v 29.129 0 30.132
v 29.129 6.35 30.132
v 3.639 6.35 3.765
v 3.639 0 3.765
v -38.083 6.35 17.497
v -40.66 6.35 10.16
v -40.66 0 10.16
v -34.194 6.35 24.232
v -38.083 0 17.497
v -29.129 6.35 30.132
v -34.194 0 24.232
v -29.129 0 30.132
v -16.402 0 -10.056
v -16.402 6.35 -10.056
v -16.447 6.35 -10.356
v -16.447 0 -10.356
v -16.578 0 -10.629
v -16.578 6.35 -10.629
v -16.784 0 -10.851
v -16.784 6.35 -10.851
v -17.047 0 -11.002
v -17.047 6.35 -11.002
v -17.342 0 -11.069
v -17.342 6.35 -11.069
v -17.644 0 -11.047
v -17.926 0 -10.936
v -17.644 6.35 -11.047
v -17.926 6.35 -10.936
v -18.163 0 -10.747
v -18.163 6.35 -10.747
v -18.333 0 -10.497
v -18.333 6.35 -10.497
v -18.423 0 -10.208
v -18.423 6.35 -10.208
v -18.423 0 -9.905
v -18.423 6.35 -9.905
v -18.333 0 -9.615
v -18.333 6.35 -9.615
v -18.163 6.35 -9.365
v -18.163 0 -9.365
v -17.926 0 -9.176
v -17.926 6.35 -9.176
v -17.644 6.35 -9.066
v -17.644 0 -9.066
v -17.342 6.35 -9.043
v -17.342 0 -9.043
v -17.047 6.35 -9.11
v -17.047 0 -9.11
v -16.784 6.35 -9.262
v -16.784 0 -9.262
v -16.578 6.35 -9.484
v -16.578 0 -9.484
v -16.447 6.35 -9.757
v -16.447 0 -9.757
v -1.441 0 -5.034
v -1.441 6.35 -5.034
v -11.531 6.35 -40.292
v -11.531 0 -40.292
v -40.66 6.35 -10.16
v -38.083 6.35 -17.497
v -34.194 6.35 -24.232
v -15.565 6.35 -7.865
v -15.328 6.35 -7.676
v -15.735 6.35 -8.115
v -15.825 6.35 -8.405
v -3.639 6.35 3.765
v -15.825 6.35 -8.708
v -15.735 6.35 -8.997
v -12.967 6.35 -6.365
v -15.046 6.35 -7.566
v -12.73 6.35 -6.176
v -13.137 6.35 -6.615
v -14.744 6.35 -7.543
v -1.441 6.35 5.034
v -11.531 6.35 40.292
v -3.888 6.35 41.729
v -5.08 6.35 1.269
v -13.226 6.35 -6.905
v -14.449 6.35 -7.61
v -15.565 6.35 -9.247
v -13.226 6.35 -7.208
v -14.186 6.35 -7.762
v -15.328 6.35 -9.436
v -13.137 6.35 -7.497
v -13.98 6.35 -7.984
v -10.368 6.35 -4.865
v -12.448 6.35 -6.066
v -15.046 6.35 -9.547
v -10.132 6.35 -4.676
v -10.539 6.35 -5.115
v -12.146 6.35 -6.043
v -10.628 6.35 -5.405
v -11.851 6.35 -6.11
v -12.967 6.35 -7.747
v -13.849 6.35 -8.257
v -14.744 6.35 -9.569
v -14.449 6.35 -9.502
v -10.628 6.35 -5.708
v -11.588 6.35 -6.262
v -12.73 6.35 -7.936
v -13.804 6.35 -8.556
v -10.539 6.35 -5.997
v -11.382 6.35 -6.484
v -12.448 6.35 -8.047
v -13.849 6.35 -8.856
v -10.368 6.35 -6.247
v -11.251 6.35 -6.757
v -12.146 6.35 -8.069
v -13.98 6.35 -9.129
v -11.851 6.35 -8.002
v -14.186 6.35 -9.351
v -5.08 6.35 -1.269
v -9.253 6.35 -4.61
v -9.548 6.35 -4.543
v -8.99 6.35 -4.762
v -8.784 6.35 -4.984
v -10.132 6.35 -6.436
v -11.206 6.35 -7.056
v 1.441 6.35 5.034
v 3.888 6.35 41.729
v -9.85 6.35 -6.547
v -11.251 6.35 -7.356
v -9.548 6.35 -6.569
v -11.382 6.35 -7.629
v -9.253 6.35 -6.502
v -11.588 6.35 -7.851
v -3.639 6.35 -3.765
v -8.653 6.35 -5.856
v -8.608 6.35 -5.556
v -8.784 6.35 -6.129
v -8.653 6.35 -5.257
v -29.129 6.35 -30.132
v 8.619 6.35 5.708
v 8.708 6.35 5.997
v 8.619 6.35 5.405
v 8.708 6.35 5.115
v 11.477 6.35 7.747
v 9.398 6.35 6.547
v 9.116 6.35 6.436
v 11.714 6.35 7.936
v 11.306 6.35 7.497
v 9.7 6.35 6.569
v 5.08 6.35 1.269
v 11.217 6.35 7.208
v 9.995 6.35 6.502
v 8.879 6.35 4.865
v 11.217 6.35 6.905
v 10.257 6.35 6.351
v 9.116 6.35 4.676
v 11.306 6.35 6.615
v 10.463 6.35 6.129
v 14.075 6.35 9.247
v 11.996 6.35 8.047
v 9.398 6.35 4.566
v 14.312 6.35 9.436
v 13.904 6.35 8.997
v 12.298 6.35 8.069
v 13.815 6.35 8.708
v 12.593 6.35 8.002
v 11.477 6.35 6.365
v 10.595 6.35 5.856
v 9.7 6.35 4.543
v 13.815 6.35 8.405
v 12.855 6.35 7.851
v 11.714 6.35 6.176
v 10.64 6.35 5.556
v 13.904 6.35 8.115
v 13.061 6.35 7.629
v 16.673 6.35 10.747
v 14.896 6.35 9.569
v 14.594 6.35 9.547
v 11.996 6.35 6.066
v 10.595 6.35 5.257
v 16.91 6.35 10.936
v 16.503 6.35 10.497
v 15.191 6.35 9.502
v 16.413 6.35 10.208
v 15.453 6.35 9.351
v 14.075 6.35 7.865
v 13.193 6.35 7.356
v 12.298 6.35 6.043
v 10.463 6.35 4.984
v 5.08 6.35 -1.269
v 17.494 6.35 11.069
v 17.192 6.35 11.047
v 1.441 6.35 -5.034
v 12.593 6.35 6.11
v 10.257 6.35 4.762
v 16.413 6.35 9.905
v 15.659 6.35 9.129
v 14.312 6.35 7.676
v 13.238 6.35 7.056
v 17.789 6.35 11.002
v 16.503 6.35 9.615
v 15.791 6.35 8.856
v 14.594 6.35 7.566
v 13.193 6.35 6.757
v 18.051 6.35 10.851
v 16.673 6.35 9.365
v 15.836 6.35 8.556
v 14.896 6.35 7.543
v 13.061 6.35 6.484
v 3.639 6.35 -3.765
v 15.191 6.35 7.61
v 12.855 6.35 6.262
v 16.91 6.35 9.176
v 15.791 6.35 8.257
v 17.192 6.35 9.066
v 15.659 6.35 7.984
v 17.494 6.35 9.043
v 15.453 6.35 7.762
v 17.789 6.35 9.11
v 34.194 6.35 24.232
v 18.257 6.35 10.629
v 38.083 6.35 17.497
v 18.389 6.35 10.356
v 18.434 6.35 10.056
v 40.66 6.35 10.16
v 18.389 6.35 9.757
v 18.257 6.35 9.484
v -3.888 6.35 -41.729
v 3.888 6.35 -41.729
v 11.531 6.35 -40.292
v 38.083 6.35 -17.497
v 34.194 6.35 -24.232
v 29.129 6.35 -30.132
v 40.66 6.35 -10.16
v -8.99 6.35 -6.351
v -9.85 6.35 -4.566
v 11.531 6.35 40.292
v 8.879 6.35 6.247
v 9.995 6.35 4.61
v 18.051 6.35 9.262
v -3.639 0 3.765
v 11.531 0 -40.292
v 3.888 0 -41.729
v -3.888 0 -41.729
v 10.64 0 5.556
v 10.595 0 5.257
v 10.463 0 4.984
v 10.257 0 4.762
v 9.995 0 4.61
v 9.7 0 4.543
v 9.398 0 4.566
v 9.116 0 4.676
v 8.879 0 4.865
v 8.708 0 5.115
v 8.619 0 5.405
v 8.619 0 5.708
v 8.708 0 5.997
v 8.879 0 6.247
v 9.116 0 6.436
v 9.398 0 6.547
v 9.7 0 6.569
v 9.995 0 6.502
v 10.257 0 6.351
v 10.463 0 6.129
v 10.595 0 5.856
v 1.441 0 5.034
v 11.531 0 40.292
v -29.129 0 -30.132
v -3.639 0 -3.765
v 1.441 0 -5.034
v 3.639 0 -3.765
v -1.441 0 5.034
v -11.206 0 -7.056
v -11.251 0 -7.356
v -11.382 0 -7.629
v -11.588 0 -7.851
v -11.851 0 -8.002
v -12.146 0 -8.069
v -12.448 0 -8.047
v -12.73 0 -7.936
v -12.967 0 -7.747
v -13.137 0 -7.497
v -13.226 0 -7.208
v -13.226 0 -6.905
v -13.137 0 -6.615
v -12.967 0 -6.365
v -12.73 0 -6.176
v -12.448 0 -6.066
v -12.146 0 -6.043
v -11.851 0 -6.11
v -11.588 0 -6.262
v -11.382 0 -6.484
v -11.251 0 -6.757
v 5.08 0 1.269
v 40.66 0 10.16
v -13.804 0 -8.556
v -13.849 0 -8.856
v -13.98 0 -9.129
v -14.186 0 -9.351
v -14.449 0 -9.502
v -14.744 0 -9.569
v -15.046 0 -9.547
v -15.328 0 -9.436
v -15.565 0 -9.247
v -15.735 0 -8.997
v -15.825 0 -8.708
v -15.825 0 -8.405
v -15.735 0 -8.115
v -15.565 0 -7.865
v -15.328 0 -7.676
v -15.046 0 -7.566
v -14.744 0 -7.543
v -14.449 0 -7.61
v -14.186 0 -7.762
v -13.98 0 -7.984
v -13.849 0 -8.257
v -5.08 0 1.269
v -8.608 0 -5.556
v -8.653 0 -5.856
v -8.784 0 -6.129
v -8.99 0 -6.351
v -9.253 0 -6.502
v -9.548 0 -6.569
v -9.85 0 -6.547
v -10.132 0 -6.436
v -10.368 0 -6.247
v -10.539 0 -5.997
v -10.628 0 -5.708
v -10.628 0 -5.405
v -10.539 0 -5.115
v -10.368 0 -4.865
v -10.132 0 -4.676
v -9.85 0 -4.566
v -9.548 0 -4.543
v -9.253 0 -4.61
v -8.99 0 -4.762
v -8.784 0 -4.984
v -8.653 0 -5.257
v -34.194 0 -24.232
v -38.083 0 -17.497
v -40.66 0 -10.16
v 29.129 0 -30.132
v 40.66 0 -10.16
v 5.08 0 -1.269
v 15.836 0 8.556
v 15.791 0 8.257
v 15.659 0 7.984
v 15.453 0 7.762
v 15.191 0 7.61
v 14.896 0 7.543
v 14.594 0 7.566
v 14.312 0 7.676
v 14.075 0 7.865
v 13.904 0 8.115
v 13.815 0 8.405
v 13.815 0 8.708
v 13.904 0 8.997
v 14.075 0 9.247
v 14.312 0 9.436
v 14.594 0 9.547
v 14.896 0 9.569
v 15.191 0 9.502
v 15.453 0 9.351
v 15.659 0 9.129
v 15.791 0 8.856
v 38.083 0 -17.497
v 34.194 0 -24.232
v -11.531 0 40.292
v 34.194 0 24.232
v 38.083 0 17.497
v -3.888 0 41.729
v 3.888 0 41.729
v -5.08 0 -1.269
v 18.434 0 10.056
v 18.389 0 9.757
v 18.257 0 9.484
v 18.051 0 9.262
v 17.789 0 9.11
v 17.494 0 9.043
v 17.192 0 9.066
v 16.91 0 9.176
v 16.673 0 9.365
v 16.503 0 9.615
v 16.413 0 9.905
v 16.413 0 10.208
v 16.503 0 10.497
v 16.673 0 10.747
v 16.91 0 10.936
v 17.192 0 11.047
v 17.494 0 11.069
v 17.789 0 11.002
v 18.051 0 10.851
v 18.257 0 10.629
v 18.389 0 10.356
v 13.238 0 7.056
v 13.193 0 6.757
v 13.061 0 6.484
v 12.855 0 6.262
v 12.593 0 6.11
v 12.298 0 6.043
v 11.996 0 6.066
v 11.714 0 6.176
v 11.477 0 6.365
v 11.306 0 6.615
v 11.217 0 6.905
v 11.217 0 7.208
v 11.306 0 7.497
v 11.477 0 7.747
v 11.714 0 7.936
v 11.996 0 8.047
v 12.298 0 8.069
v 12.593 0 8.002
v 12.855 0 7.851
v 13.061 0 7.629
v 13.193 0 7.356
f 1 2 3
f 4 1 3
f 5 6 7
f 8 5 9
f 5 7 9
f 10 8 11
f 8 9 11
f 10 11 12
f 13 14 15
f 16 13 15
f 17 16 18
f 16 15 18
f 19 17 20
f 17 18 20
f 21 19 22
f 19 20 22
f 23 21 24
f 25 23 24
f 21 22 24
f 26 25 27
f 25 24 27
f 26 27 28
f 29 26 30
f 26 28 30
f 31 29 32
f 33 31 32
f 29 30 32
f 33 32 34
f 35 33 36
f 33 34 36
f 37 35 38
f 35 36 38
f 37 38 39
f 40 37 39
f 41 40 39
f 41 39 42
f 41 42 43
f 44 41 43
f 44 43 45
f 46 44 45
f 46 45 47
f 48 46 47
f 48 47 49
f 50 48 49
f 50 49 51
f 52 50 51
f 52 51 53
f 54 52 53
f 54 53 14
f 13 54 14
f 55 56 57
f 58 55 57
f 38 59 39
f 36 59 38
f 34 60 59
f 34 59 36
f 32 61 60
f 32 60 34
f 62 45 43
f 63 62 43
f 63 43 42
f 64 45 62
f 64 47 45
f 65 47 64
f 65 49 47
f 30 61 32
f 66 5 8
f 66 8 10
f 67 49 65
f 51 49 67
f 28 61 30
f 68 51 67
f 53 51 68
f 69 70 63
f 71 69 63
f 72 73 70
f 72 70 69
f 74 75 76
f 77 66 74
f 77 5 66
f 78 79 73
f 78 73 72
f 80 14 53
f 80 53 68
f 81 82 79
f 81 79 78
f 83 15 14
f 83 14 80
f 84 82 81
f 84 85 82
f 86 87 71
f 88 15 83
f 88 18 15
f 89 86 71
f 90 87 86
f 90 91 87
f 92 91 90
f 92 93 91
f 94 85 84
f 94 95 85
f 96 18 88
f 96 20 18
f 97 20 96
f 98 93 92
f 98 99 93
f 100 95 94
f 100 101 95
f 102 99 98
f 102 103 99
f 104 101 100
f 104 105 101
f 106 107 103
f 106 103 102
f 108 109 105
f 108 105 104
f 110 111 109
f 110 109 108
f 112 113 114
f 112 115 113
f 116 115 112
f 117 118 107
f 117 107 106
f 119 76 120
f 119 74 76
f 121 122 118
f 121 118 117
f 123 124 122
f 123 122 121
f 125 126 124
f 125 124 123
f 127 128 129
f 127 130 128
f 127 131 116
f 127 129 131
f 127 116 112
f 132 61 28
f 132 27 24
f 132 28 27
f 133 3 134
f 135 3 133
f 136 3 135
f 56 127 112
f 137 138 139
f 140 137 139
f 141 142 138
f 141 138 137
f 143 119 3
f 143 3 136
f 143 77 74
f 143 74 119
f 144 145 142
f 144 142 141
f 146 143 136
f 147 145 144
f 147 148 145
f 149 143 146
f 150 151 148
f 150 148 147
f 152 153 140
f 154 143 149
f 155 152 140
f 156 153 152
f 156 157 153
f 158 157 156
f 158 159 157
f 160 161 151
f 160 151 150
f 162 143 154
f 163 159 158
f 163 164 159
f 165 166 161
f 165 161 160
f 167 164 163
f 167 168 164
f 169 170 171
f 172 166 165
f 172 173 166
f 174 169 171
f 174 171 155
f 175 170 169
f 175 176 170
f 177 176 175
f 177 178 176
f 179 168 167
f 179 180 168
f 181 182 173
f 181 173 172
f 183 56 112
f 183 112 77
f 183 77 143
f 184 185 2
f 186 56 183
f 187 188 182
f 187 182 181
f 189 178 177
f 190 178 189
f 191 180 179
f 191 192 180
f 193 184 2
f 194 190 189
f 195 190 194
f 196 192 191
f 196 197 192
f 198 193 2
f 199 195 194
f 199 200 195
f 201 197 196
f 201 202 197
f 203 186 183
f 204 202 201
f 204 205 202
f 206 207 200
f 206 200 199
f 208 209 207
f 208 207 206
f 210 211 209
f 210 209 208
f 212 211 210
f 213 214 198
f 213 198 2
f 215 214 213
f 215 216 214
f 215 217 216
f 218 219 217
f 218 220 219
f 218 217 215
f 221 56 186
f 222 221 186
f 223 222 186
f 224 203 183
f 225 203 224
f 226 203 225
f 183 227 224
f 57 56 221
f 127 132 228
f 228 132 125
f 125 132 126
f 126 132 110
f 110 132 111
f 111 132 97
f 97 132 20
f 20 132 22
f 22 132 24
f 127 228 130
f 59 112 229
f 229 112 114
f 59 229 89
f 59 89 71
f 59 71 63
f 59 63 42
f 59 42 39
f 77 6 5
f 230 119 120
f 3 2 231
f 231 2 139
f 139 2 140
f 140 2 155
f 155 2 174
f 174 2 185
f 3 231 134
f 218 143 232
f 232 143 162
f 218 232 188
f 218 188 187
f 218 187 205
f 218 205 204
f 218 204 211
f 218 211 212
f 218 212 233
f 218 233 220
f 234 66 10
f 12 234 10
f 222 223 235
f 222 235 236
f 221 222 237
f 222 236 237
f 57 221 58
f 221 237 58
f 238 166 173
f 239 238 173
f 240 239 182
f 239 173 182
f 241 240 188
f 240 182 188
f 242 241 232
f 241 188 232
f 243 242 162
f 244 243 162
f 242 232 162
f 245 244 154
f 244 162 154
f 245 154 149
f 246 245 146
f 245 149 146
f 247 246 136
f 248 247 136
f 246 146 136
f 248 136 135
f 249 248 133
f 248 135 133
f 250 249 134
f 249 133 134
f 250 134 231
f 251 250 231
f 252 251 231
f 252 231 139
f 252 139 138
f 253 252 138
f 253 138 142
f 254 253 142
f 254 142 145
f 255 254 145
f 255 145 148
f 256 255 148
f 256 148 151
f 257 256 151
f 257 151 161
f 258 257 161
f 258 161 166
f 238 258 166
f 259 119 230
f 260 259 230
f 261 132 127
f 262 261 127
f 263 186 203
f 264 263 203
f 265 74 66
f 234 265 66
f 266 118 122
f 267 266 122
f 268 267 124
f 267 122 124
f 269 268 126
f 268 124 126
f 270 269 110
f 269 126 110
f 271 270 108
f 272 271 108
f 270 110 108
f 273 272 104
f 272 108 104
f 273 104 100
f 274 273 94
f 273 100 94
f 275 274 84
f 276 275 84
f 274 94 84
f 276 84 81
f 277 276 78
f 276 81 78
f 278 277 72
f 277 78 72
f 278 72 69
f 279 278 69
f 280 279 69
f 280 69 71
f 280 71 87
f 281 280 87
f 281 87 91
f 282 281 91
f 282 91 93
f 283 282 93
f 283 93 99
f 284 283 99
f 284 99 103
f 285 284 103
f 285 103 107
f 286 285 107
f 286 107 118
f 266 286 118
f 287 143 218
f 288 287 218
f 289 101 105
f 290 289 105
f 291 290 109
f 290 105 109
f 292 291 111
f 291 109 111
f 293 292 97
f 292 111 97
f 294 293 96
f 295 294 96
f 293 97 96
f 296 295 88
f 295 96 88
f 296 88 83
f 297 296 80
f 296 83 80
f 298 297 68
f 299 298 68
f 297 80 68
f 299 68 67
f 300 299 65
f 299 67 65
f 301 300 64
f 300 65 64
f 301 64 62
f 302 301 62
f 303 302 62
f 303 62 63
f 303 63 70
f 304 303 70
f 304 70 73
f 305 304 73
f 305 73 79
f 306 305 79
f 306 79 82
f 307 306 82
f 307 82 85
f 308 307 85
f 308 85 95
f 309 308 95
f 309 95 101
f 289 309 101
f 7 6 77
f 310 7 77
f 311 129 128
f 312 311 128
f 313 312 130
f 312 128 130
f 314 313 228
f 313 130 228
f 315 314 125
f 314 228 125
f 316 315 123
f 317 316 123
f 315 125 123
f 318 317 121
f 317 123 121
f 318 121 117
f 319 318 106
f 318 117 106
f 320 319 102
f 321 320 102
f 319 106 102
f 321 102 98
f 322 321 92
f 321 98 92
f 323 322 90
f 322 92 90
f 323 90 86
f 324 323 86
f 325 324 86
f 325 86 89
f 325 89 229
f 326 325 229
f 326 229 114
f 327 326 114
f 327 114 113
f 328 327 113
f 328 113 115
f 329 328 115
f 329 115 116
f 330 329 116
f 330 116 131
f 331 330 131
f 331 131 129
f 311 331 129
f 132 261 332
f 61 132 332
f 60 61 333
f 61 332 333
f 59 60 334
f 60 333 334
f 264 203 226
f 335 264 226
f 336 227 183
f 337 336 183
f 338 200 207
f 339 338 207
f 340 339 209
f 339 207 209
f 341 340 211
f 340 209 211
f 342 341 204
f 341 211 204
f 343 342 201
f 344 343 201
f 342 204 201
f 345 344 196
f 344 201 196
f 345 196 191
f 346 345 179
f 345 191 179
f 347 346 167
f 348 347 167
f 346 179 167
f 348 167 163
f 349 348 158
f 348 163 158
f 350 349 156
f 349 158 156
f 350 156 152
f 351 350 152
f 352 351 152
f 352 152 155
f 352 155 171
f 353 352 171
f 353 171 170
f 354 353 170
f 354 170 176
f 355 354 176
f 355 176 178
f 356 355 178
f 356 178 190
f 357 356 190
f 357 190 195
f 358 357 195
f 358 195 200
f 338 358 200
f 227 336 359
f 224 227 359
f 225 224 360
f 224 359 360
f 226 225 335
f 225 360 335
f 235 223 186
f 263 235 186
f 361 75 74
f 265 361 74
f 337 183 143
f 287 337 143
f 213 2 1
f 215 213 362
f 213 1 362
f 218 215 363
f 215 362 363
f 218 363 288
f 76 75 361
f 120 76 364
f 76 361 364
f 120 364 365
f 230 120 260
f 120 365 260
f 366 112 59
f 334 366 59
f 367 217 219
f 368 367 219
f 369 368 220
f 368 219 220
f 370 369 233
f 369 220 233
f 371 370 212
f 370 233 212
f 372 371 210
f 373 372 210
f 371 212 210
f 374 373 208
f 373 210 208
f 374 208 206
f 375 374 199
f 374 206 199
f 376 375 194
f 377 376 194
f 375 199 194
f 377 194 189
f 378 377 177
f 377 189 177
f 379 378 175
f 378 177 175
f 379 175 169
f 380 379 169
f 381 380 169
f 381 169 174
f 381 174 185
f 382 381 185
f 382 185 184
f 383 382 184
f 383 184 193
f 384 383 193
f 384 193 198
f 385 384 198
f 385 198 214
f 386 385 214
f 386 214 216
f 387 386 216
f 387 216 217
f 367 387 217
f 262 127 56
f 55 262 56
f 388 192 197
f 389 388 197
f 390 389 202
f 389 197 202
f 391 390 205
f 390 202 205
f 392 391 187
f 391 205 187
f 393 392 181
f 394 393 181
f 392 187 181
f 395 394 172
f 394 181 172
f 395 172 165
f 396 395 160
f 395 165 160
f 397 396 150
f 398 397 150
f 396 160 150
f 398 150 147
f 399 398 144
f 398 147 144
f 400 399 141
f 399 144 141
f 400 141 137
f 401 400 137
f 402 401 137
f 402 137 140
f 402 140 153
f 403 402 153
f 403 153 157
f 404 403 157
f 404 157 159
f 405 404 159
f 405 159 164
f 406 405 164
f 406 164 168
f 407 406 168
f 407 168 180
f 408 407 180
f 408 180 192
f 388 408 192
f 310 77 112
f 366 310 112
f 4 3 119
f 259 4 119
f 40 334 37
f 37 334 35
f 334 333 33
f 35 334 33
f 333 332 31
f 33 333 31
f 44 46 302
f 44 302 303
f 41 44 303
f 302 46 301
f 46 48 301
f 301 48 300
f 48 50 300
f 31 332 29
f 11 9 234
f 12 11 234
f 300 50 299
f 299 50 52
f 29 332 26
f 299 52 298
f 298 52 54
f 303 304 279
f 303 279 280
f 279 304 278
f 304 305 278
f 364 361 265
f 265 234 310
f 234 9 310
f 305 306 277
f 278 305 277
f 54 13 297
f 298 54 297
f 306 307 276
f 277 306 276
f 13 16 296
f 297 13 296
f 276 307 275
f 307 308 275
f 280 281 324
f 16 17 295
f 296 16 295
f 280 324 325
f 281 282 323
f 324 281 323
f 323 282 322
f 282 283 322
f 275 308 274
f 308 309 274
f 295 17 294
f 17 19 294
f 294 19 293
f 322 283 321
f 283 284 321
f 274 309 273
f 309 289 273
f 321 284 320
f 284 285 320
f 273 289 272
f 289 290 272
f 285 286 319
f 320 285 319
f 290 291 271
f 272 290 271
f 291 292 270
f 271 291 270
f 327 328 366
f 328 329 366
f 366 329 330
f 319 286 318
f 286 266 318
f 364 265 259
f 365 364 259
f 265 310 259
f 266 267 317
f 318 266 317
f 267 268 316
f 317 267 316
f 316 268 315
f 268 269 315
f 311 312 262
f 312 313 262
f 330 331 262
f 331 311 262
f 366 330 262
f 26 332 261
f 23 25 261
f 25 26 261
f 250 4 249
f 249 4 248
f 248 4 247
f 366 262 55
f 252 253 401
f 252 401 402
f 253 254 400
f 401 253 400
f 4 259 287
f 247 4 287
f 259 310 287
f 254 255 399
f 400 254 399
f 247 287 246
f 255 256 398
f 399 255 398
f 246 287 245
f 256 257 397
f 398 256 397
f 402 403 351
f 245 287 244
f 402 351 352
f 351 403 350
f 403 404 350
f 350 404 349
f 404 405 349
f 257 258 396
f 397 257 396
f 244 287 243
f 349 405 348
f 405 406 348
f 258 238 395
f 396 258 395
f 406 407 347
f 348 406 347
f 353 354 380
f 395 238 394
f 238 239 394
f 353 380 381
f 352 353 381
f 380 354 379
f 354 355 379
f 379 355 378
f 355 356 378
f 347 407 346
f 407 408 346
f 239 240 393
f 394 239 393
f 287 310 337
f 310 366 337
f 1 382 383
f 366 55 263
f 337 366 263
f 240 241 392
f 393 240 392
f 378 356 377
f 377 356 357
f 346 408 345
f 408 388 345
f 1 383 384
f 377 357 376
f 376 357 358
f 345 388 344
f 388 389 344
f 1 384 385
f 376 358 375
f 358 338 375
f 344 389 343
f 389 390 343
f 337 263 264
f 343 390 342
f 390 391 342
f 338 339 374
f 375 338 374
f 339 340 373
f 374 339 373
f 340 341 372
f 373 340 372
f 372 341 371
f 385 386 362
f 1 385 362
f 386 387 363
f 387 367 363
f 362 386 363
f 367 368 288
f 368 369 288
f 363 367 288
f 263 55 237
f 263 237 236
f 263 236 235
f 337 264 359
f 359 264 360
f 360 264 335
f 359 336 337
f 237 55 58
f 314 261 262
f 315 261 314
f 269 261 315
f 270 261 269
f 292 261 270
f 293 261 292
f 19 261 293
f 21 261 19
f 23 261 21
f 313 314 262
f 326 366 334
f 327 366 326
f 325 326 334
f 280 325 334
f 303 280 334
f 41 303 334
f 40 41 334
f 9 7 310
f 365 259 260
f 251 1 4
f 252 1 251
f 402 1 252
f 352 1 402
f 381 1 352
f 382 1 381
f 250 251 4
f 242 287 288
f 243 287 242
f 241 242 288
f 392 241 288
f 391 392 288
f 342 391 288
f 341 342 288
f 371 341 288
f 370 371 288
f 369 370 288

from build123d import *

# Parameters (mm, degrees)
SKETCH1_R           = 41.91
BOSS_EXTRUDE1_DEPTH = 6.35
CUT_EXTRUDE1_DEPTH  = 7.35
SKETCH3_R           = 1.016
CUT_EXTRUDE2_DEPTH  = 7.35


with BuildPart() as part:
    # Sketch1 → Boss-Extrude1 (new body)
    with BuildSketch(Plane(origin=(0, 0, 0), x_dir=(1, 0, 0), z_dir=(0, 1, 0))):
        Circle(SKETCH1_R)
    extrude(amount=BOSS_EXTRUDE1_DEPTH)

    # Sketch2 → Cut-Extrude1 (cut, through all)
    with BuildSketch(Plane(origin=(0, 6.35, 0), x_dir=(1, 0, 0), z_dir=(0, 1, 0))):
        with BuildLine():
            Line((-1.440684381, 5.03409922), (-11.531101351, 40.292453408))
            ThreePointArc((-11.531101351, 40.292453408), (-20.955, 36.295124673), (-29.128737556, 30.132453408))
            Line((-29.128737556, 30.132453408), (-3.639315619, 3.764718883))
            Line((-3.639315619, 3.764718883), (-1.440684381, 5.03409922))
        make_face()
        with BuildLine():
            Line((3.639315619, 3.764718883), (29.128737556, 30.132453408))
            ThreePointArc((29.128737556, 30.132453408), (20.955, 36.295124673), (11.531101351, 40.292453408))
            Line((11.531101351, 40.292453408), (1.440684381, 5.03409922))
            Line((1.440684381, 5.03409922), (3.639315619, 3.764718883))
        make_face()
        with BuildLine():
            Line((5.08, -1.269380337), (40.659838908, -10.16))
            ThreePointArc((40.659838908, -10.16), (41.596285583, -5.118312778), (41.91, 0))
            ThreePointArc((41.91, 0), (41.596285583, 5.118312778), (40.659838908, 10.16))
            Line((40.659838908, 10.16), (5.08, 1.269380337))
            Line((5.08, 1.269380337), (5.08, -1.269380337))
        make_face()
        with BuildLine():
            ThreePointArc((11.531101351, -40.292453408), (20.955, -36.295124673), (29.128737556, -30.132453408))
            Line((29.128737556, -30.132453408), (3.639315619, -3.764718883))
            Line((3.639315619, -3.764718883), (1.440684381, -5.03409922))
            Line((1.440684381, -5.03409922), (11.531101351, -40.292453408))
        make_face()
        with BuildLine():
            ThreePointArc((-29.128737556, -30.132453408), (-20.955, -36.295124673), (-11.531101351, -40.292453408))
            Line((-11.531101351, -40.292453408), (-1.440684381, -5.03409922))
            Line((-1.440684381, -5.03409922), (-3.639315619, -3.764718883))
            Line((-3.639315619, -3.764718883), (-29.128737556, -30.132453408))
        make_face()
        with BuildLine():
            ThreePointArc((-40.659838908, 10.16), (-41.91, 0), (-40.659838908, -10.16))
            Line((-40.659838908, -10.16), (-5.08, -1.269380337))
            Line((-5.08, -1.269380337), (-5.08, 1.269380337))
            Line((-5.08, 1.269380337), (-40.659838908, 10.16))
        make_face()
    extrude(amount=-CUT_EXTRUDE1_DEPTH, mode=Mode.SUBTRACT)

    # Sketch3 → Cut-Extrude2 (cut, through all)
    with BuildSketch(Plane(origin=(0, 6.35, 0), x_dir=(1, 0, 0), z_dir=(0, 1, 0))):
        with Locations((17.417935934, -10.05625)):
            Circle(SKETCH3_R)
        with Locations((-7.05625, -12.221783511)):
            Circle(SKETCH3_R)
        with Locations((-8.55625, -14.819859722)):
            Circle(SKETCH3_R)
        with Locations((-10.05625, -17.417935934)):
            Circle(SKETCH3_R)
        with Locations((-9.6237073, 5.55625)):
            Circle(SKETCH3_R)
        with Locations((5.55625, 9.6237073)):
            Circle(SKETCH3_R)
        with Locations((9.6237073, -5.55625)):
            Circle(SKETCH3_R)
        with Locations((-5.55625, -9.6237073)):
            Circle(SKETCH3_R)
        with Locations((-14.819859722, 8.55625)):
            Circle(SKETCH3_R)
        with Locations((-17.417935934, 10.05625)):
            Circle(SKETCH3_R)
        with Locations((-12.221783511, 7.05625)):
            Circle(SKETCH3_R)
        with Locations((7.05625, 12.221783511)):
            Circle(SKETCH3_R)
        with Locations((8.55625, 14.819859722)):
            Circle(SKETCH3_R)
        with Locations((10.05625, 17.417935934)):
            Circle(SKETCH3_R)
        with Locations((12.221783511, -7.05625)):
            Circle(SKETCH3_R)
        with Locations((14.819859722, -8.55625)):
            Circle(SKETCH3_R)
    extrude(amount=-CUT_EXTRUDE2_DEPTH, mode=Mode.SUBTRACT)


solid = part.part
